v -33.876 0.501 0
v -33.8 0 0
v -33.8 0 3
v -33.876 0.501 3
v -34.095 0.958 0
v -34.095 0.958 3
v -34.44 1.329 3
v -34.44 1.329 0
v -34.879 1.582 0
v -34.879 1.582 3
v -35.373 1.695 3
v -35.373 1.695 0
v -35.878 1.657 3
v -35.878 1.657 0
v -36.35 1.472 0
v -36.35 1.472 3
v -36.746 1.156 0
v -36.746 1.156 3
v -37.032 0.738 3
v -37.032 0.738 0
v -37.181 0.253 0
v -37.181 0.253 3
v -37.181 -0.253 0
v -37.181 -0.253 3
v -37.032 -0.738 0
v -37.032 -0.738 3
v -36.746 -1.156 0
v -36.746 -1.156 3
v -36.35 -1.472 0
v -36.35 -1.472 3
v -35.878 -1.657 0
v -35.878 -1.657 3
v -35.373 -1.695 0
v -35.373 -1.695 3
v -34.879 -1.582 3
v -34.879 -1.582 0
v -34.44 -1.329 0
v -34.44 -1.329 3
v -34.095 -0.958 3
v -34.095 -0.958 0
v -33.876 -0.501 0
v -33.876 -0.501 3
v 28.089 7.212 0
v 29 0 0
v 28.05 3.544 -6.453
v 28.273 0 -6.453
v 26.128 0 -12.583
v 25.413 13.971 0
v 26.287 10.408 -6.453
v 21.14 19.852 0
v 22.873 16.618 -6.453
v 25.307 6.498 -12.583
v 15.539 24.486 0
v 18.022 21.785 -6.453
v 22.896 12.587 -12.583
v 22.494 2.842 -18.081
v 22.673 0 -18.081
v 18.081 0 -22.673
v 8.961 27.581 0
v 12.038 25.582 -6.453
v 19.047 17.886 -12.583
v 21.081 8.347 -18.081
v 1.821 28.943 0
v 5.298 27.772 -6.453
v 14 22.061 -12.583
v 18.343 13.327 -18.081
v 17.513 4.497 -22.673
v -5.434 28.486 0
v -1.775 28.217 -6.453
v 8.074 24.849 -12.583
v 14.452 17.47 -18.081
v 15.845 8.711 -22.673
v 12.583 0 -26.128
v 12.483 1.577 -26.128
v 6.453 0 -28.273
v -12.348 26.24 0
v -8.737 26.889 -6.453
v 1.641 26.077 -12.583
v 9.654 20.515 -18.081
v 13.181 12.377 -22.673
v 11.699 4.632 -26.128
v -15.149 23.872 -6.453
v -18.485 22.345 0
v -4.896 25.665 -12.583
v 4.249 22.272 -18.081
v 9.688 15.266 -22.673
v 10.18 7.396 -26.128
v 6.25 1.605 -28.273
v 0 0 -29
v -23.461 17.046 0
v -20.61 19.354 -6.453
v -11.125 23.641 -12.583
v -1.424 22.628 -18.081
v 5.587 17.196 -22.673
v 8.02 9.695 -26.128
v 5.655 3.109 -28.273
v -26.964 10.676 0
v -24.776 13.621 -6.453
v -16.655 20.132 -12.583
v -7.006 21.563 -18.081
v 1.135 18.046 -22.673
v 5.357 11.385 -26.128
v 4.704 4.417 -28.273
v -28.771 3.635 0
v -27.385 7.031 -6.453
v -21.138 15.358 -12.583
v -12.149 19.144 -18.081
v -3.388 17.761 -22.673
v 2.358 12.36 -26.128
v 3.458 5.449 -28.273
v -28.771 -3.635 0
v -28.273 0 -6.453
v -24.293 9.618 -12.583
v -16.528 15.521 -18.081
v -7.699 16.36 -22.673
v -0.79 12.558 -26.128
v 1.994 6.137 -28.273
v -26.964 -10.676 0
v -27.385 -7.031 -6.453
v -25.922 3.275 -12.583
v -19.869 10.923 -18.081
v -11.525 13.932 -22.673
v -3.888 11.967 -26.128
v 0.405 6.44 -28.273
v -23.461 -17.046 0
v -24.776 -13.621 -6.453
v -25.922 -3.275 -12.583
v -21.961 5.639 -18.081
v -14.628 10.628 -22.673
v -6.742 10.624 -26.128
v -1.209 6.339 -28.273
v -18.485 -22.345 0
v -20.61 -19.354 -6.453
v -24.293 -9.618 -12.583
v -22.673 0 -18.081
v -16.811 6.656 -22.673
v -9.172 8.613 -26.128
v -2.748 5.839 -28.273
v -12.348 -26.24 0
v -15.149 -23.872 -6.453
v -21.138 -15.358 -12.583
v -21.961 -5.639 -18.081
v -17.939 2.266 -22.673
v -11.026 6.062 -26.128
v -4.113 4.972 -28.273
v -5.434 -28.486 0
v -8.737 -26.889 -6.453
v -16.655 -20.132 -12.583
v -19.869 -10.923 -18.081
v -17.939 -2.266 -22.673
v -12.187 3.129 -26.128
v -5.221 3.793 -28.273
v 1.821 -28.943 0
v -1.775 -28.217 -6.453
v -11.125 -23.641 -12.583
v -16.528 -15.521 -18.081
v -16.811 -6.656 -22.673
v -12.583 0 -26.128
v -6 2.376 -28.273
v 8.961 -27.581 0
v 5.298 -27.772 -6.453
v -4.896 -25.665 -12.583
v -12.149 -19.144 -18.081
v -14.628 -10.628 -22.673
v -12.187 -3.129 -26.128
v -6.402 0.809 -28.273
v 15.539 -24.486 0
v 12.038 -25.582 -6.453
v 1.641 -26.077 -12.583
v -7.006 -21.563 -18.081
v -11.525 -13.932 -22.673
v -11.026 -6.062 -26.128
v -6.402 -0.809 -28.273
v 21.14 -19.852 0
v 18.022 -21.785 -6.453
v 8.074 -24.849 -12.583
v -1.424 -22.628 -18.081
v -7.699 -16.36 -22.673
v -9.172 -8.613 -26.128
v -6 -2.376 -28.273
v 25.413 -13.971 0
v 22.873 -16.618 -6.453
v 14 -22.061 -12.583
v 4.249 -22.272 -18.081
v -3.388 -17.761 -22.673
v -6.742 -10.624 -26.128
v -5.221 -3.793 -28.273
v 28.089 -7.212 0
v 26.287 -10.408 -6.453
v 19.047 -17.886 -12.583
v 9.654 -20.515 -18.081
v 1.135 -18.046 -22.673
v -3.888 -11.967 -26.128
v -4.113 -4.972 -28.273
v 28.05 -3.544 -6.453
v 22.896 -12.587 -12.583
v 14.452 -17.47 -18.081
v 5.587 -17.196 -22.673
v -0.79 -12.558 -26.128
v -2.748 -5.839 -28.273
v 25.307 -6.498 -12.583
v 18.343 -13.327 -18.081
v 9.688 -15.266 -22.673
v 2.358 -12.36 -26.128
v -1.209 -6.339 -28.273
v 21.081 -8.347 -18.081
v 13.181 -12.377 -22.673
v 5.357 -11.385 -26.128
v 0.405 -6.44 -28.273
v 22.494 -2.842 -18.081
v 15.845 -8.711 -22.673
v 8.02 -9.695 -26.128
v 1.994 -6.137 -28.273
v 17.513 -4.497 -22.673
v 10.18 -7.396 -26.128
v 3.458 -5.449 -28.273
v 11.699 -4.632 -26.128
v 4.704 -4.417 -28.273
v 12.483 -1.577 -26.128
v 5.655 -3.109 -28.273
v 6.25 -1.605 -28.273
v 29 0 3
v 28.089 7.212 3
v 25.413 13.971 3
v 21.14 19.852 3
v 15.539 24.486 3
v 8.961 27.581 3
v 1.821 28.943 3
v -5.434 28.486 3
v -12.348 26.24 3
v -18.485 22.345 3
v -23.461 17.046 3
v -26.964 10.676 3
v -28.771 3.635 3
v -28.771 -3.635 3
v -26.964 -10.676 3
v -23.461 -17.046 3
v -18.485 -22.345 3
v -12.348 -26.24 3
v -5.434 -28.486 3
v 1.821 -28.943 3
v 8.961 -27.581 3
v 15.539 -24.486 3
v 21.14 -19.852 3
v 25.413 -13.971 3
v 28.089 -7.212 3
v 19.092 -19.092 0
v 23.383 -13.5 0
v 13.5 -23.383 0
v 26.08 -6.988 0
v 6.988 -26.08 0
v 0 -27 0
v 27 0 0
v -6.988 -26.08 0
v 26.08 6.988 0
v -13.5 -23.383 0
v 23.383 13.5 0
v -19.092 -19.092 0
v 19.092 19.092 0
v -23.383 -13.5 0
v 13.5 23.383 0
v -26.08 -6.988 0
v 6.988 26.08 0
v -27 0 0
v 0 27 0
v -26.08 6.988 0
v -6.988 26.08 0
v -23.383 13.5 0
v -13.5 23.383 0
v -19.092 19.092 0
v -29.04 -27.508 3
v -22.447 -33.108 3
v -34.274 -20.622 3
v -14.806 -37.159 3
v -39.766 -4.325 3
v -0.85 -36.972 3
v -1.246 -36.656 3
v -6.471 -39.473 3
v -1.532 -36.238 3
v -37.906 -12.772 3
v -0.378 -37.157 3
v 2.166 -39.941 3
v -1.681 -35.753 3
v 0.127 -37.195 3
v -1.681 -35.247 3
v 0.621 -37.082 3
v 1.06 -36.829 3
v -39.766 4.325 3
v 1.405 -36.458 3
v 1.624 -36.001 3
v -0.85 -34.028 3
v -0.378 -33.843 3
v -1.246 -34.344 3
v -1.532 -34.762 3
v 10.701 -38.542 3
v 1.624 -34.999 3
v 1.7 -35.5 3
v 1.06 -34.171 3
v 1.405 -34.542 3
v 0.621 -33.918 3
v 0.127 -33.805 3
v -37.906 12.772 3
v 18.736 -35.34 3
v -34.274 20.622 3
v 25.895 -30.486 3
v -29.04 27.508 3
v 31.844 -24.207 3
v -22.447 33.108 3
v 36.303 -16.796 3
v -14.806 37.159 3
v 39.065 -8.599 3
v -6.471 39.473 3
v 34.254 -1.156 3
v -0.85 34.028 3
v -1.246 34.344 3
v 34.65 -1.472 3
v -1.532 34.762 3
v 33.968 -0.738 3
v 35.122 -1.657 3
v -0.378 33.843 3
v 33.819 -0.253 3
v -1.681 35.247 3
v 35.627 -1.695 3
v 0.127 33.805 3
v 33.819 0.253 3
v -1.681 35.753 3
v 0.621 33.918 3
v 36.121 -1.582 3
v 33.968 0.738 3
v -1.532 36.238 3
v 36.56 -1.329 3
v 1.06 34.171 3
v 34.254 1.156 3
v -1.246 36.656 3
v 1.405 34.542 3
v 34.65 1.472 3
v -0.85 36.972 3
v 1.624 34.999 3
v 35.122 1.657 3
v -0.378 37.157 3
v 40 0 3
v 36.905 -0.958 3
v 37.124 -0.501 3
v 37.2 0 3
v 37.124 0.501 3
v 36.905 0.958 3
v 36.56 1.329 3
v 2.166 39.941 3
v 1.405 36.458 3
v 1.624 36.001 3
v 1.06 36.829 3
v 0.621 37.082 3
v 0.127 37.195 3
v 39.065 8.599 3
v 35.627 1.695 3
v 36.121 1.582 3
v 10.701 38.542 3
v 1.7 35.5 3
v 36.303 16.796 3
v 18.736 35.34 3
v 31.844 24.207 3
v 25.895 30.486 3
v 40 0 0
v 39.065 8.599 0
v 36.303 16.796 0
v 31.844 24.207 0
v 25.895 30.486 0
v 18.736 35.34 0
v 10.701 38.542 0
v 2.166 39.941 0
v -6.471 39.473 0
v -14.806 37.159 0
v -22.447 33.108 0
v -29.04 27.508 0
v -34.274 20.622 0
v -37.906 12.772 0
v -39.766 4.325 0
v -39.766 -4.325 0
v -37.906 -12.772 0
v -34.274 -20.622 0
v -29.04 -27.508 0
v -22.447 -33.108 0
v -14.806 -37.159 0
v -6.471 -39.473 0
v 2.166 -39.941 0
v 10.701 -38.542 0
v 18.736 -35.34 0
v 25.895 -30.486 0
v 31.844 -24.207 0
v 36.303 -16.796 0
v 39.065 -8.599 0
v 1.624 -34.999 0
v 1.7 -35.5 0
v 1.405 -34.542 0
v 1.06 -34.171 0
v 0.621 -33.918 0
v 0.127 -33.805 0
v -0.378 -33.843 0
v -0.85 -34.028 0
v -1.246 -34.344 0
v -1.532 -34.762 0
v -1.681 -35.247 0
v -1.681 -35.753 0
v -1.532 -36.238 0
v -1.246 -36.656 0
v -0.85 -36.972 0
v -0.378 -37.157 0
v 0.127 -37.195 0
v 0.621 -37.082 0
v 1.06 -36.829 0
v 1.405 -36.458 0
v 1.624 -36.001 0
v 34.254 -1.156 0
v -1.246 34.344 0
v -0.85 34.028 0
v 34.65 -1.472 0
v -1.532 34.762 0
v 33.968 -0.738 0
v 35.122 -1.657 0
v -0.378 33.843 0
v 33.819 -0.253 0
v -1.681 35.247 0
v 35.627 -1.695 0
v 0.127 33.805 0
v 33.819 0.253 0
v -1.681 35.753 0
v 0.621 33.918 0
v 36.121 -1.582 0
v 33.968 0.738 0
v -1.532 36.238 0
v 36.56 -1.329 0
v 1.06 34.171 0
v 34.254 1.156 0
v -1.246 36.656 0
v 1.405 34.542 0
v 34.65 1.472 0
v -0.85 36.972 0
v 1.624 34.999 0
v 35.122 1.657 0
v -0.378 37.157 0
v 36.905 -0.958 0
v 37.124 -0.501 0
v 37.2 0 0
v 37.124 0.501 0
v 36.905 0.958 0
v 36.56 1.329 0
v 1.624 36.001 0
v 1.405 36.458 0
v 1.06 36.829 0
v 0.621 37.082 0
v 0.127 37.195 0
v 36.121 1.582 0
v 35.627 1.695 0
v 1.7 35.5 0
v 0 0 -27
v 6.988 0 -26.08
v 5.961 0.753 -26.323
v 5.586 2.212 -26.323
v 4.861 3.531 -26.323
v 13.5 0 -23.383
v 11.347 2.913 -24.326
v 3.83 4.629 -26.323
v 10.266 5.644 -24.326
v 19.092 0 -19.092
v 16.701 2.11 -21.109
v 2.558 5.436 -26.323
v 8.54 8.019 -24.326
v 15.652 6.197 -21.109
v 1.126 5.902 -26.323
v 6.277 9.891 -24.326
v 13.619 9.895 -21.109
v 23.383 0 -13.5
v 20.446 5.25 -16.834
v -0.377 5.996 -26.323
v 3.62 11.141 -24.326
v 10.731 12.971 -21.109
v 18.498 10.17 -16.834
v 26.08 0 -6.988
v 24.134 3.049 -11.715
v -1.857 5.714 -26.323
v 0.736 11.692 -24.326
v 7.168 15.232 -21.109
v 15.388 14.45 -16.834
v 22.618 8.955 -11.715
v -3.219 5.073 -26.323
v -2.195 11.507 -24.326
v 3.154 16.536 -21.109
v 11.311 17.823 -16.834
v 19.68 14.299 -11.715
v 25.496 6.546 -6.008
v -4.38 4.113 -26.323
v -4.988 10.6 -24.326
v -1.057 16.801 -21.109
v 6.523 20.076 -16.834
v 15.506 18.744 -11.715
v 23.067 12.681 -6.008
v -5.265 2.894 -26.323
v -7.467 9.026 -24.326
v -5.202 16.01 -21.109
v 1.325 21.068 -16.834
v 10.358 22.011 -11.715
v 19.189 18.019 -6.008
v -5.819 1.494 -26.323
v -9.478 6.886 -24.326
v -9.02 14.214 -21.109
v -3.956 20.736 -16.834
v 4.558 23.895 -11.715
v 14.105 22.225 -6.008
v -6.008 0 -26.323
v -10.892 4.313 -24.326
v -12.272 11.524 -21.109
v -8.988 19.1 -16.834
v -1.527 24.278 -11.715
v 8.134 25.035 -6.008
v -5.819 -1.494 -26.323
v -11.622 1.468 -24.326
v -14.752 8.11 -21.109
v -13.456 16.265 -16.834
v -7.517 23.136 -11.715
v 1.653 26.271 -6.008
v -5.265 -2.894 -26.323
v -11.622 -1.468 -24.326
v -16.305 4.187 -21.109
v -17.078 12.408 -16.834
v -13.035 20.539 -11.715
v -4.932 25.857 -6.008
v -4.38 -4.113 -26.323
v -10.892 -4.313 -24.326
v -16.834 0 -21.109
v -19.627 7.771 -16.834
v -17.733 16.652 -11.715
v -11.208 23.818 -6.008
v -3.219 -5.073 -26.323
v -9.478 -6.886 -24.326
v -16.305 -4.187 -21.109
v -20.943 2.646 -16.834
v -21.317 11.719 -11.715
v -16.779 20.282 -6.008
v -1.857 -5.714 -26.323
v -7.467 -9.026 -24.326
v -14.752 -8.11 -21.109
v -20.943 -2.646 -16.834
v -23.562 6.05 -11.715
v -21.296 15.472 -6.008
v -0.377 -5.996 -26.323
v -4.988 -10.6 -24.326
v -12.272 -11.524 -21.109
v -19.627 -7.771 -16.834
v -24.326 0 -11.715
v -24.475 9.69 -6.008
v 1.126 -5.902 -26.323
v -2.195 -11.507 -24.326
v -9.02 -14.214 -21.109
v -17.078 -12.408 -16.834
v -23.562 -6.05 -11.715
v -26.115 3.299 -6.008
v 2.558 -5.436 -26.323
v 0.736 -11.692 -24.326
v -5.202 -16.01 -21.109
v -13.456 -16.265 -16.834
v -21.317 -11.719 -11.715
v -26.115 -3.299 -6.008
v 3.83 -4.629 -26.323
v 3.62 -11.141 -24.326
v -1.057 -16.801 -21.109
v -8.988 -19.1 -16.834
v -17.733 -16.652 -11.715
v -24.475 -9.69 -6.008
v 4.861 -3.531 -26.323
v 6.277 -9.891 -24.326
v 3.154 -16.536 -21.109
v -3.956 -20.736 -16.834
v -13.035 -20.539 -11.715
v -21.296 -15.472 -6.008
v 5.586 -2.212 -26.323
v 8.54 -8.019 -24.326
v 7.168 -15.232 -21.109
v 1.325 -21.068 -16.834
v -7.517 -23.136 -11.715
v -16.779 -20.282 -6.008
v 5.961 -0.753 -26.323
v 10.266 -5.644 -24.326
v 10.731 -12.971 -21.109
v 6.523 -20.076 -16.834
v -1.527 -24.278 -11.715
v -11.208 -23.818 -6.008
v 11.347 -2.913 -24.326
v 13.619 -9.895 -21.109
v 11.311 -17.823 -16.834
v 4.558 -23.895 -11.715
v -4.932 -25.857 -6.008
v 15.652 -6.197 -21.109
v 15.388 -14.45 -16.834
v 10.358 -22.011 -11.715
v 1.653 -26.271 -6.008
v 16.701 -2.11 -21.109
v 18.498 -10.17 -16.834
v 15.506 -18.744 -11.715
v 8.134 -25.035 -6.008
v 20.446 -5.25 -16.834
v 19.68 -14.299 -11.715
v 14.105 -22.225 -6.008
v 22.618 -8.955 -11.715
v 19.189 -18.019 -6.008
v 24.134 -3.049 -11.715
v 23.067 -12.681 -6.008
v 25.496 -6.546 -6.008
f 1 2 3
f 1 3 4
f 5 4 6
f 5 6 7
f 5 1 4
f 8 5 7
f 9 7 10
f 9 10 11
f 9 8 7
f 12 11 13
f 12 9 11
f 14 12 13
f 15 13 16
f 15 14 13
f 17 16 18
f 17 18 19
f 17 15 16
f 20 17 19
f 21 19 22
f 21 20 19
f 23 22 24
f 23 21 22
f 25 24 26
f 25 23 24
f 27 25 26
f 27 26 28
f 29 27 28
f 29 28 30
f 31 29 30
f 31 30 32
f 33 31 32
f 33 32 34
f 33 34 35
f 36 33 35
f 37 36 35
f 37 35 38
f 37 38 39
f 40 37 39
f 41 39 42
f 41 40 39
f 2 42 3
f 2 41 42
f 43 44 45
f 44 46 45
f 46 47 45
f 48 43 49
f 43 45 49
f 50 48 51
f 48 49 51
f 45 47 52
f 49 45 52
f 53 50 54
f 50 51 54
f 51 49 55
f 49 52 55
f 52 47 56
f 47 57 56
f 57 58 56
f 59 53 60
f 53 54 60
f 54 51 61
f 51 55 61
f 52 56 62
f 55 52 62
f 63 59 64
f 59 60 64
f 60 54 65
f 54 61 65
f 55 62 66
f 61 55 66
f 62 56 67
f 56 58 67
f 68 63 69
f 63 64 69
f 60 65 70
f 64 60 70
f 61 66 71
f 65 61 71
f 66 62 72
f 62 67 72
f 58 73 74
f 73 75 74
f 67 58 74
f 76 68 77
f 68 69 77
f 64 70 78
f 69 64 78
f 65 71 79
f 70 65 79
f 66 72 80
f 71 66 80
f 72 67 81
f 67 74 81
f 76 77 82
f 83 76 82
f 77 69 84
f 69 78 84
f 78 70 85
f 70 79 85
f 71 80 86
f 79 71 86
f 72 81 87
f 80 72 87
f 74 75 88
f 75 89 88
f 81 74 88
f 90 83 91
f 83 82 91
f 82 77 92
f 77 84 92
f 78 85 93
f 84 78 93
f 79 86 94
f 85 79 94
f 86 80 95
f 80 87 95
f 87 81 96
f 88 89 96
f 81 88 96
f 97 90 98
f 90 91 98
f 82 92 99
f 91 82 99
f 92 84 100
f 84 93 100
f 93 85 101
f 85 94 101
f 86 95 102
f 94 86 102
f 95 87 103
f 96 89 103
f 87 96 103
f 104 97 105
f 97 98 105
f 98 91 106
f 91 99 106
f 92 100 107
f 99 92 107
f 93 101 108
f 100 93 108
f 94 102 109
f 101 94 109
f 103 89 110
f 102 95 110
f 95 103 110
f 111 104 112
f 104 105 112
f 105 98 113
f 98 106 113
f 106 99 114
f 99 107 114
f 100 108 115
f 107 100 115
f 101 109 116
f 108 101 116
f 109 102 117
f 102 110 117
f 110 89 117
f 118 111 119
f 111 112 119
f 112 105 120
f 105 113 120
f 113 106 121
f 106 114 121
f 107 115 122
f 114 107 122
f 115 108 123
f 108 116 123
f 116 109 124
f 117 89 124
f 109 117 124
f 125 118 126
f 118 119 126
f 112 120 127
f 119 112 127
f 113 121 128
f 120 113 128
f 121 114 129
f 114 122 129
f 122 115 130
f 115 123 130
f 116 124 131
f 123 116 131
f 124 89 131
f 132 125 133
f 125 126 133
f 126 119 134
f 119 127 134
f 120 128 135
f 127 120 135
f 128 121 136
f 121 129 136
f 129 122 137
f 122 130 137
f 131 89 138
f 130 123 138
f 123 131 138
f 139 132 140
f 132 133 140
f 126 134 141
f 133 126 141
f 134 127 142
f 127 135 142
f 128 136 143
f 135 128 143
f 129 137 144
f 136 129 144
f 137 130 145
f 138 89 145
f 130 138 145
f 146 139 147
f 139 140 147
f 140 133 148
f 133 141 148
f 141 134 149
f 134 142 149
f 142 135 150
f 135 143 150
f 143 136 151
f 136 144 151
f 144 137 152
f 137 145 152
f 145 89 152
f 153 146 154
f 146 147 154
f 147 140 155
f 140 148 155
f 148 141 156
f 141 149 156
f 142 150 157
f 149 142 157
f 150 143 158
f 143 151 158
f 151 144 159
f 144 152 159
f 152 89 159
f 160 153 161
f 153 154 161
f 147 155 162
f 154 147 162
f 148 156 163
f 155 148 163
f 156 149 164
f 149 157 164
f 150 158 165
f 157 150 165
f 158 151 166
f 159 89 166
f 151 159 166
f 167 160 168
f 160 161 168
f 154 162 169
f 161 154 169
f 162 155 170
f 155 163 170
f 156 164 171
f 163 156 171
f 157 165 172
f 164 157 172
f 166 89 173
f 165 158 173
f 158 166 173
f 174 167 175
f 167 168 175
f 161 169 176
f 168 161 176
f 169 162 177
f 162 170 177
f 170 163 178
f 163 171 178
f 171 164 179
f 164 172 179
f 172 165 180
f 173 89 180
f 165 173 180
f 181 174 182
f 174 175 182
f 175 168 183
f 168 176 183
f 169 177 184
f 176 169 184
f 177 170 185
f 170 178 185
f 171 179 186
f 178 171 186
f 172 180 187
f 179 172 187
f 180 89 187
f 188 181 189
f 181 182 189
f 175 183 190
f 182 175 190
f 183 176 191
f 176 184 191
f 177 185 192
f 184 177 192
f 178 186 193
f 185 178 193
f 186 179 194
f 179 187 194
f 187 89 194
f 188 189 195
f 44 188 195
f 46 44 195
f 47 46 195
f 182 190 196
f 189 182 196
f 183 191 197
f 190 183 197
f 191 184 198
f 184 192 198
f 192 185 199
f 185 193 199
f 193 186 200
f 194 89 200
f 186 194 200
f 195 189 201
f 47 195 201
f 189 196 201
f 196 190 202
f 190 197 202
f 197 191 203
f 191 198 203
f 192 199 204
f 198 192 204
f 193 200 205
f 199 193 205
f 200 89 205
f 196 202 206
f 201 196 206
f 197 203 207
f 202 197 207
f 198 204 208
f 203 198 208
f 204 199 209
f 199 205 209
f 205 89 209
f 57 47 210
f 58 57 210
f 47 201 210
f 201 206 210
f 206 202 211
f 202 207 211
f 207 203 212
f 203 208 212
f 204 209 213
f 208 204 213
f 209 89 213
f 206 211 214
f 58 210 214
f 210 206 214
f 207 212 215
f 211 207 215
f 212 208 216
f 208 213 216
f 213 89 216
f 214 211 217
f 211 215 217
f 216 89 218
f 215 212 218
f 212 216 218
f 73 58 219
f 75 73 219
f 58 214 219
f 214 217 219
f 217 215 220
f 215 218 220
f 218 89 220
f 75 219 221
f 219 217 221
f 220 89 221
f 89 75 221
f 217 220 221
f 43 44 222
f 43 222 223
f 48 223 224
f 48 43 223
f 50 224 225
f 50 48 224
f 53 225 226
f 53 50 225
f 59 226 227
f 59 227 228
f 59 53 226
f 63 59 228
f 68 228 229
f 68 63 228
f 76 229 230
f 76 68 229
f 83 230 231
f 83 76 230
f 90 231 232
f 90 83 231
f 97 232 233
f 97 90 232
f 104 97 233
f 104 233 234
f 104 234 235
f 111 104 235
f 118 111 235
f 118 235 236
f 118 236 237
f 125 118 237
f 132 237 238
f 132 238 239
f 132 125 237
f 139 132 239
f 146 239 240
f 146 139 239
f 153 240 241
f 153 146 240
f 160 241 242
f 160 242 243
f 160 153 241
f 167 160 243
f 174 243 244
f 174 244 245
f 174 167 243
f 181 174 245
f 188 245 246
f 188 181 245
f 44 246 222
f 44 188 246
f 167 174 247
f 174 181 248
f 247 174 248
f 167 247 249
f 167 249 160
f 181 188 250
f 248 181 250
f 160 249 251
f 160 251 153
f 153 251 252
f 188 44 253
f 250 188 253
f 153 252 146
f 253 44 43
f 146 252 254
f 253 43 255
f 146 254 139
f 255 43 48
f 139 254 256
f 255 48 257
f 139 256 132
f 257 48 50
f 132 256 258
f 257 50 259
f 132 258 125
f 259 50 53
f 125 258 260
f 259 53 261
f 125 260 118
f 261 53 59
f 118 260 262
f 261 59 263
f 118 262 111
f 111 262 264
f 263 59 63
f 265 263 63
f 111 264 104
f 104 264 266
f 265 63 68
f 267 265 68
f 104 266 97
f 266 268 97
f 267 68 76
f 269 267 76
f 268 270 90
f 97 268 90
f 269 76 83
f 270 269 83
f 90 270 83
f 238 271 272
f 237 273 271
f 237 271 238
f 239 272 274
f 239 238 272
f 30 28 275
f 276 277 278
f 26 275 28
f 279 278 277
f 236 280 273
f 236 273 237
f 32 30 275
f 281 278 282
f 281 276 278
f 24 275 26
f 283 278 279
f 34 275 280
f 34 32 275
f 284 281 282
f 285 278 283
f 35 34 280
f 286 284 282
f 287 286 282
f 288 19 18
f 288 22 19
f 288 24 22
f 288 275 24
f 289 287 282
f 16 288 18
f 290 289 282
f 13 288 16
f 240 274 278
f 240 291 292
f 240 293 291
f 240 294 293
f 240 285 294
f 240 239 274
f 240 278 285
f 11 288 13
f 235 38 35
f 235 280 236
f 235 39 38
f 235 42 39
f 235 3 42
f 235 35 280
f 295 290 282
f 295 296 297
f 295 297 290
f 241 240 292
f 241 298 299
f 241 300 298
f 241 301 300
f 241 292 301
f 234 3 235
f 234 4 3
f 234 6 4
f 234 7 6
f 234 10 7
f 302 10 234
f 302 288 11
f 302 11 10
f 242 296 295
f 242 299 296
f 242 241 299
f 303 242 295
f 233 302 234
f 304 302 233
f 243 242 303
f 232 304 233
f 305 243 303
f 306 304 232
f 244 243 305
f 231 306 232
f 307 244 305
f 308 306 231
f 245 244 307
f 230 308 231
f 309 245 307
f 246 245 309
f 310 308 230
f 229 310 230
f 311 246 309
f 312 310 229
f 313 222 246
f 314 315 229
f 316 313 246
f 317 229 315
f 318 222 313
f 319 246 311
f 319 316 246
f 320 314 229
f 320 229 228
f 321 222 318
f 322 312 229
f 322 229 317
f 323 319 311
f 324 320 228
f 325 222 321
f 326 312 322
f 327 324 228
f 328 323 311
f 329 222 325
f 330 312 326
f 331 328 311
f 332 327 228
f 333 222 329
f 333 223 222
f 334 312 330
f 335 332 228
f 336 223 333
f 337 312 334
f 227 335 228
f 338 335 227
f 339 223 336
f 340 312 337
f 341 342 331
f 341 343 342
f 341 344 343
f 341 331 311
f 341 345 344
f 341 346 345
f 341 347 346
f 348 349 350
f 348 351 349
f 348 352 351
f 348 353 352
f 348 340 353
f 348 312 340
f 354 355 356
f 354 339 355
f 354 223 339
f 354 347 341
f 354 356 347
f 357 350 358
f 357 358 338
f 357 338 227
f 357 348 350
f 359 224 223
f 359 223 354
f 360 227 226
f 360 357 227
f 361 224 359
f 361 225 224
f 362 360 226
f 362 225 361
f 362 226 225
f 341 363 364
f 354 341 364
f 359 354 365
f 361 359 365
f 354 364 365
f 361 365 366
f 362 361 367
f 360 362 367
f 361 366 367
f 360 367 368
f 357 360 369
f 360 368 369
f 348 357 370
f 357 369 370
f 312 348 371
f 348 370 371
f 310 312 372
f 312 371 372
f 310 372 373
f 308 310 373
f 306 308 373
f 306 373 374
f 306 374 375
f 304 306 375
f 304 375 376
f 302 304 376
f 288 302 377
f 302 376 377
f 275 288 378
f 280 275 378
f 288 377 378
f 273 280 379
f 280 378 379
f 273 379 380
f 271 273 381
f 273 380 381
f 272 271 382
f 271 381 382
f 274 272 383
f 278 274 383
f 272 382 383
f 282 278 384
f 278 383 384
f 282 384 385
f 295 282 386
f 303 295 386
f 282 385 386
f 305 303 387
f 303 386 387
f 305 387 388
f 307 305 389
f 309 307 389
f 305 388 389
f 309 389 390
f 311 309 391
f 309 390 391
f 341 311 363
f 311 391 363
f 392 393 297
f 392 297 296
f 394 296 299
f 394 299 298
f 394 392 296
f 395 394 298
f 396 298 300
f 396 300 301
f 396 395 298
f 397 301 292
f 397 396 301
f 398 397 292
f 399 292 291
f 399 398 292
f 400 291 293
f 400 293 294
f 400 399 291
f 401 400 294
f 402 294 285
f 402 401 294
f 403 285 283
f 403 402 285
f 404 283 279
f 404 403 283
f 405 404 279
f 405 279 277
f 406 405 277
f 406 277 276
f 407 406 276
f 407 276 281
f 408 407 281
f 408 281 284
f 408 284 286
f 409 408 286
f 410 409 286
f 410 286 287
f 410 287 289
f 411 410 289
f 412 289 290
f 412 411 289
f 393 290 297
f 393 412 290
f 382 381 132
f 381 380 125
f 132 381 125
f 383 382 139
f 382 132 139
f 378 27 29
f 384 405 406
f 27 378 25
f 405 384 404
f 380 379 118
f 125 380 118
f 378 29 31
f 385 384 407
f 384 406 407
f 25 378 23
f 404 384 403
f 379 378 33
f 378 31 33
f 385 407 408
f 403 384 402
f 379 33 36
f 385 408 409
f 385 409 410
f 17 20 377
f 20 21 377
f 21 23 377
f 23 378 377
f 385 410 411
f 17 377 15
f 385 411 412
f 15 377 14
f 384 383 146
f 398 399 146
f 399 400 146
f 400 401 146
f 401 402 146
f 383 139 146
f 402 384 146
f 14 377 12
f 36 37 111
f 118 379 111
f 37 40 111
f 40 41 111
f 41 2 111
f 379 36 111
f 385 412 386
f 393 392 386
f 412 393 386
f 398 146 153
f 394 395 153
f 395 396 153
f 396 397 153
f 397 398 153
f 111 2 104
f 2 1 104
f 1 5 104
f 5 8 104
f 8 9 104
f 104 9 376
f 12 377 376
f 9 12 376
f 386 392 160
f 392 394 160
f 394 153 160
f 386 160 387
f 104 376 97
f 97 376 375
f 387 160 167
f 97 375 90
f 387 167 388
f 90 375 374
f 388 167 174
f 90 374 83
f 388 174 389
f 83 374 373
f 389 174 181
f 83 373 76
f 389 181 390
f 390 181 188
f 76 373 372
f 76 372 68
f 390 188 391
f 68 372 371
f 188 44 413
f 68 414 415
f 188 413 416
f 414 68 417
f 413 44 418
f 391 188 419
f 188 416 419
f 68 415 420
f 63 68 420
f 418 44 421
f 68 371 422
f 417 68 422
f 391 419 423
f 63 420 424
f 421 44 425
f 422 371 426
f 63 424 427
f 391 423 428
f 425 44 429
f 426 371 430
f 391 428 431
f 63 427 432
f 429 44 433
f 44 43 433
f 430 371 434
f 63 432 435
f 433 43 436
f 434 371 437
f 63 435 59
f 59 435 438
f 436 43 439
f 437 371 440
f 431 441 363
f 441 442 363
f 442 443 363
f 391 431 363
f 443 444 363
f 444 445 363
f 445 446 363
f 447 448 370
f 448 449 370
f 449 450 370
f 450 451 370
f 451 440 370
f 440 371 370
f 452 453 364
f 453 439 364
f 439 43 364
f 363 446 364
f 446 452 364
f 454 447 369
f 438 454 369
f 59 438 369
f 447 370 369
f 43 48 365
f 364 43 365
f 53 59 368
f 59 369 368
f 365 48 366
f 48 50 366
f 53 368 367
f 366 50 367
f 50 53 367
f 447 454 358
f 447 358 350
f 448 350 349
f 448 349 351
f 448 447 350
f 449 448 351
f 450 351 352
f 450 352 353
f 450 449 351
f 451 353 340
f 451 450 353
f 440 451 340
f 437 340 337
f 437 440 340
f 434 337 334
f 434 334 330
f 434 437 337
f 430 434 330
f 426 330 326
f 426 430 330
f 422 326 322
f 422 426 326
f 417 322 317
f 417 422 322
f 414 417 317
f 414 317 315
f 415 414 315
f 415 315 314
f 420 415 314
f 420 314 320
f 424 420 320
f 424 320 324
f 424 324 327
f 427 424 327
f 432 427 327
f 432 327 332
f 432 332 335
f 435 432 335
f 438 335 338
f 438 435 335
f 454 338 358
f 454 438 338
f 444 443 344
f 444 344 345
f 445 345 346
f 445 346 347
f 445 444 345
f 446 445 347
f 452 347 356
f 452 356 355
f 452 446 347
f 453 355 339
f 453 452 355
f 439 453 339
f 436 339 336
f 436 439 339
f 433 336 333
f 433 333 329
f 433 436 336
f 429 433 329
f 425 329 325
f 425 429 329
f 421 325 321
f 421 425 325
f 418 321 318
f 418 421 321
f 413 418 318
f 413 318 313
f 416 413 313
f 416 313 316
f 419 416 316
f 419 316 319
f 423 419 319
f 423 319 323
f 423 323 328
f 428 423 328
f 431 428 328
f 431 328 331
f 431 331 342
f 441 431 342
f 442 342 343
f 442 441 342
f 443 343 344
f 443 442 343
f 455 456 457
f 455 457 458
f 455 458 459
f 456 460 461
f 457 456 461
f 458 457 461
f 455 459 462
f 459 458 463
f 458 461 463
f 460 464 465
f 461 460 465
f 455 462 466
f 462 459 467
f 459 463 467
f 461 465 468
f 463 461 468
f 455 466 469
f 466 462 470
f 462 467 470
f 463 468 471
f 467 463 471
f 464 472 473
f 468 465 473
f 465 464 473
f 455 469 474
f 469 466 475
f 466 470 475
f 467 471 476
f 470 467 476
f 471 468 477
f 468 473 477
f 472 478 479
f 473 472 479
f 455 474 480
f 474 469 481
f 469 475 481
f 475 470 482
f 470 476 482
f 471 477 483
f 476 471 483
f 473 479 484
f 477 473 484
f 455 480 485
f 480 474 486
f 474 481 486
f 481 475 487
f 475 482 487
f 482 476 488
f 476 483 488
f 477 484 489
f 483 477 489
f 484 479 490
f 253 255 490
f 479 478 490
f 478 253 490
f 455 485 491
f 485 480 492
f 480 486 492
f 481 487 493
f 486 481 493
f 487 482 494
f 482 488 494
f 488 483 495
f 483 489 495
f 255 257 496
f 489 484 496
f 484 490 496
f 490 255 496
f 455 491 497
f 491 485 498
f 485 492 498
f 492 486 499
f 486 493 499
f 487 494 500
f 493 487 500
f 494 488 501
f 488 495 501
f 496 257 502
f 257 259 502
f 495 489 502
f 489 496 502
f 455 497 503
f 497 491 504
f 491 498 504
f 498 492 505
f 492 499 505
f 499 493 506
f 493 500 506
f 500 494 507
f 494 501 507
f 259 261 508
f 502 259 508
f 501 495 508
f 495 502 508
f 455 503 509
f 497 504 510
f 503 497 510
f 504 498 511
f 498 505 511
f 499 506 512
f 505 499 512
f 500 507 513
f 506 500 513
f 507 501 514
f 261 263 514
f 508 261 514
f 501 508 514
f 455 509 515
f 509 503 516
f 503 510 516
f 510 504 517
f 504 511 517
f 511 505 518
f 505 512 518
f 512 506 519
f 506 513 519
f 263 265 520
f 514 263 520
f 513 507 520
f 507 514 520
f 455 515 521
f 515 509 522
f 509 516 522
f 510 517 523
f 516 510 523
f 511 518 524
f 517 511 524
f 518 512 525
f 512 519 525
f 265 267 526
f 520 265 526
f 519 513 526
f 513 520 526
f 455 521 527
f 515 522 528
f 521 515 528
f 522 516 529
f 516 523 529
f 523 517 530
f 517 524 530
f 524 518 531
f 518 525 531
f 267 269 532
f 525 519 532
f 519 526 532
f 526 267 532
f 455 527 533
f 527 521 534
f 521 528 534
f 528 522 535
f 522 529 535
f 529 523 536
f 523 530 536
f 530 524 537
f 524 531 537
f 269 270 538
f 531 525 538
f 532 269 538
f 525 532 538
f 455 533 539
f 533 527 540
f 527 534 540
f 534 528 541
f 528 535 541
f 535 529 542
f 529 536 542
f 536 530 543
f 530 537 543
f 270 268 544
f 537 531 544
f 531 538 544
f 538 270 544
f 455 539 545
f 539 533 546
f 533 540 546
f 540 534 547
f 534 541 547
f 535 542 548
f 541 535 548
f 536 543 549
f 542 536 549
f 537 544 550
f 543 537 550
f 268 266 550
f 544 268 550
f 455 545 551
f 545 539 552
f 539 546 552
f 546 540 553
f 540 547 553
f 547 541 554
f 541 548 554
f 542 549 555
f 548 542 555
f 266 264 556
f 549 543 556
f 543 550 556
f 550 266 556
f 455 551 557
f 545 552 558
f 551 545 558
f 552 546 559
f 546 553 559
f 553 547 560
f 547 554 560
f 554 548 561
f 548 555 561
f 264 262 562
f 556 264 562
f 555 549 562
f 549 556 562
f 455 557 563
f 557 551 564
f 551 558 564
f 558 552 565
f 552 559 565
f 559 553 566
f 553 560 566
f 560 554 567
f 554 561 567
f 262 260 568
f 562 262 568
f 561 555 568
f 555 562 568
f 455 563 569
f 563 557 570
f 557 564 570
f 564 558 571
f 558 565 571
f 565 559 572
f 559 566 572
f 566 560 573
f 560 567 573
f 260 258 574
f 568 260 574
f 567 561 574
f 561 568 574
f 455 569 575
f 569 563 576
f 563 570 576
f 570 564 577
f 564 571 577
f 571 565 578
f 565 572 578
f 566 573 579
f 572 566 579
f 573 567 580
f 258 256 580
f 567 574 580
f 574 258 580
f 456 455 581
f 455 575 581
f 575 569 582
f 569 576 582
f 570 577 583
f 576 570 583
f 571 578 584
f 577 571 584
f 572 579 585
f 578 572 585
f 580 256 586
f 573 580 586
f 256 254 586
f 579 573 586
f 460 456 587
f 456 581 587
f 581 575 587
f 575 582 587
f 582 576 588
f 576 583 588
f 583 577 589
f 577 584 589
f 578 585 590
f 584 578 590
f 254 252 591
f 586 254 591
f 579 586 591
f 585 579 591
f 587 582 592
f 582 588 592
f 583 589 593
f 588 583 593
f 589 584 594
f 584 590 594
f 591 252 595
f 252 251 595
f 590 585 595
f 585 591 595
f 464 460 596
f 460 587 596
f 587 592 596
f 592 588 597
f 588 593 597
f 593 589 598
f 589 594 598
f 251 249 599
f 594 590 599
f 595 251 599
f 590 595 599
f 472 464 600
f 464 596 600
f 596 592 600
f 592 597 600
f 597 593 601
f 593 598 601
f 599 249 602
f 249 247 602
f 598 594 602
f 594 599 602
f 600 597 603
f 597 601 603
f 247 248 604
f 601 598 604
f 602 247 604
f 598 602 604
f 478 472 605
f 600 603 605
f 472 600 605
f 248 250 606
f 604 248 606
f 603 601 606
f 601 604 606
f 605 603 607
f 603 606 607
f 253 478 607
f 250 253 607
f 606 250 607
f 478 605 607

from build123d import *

# Parameters (mm, degrees)
SKETCH_1_R      = 40
SKETCH_1_R_2    = 1.7
SKETCH_1_R_3    = 29
EXTRUDE_1_DEPTH = 3


with BuildPart() as part:
    # 草图1 → 凸台-拉伸1 (new body)
    with BuildSketch(Plane.XY):
        Circle(SKETCH_1_R)
        with Locations((0, 35.5)):
            Circle(SKETCH_1_R_2, mode=Mode.SUBTRACT)
        with Locations((35.5, 0)):
            Circle(SKETCH_1_R_2, mode=Mode.SUBTRACT)
        with Locations((0, -35.5)):
            Circle(SKETCH_1_R_2, mode=Mode.SUBTRACT)
        with Locations((-35.5, 0)):
            Circle(SKETCH_1_R_2, mode=Mode.SUBTRACT)
        Circle(SKETCH_1_R_3, mode=Mode.SUBTRACT)
    extrude(amount=EXTRUDE_1_DEPTH)


with BuildPart() as body_2:
    # 草图2 → 旋转1 (revolve)
    with BuildSketch(Plane(origin=(0, 0, 0), x_dir=(1, 0, 0), z_dir=(0, 1, 0))):
        with BuildLine():
            Line((27, 0), (29, 0))
            ThreePointArc((29, 0), (20.506096654, 20.506096654), (0, 29))
            Line((0, 29), (0, 27))
            ThreePointArc((0, 27), (19.091883092, 19.091883092), (27, 0))
        make_face()
    revolve(axis=Axis((0, 0, -29), (0, 0, 1)))


solid = Compound([part.part, body_2.part])
